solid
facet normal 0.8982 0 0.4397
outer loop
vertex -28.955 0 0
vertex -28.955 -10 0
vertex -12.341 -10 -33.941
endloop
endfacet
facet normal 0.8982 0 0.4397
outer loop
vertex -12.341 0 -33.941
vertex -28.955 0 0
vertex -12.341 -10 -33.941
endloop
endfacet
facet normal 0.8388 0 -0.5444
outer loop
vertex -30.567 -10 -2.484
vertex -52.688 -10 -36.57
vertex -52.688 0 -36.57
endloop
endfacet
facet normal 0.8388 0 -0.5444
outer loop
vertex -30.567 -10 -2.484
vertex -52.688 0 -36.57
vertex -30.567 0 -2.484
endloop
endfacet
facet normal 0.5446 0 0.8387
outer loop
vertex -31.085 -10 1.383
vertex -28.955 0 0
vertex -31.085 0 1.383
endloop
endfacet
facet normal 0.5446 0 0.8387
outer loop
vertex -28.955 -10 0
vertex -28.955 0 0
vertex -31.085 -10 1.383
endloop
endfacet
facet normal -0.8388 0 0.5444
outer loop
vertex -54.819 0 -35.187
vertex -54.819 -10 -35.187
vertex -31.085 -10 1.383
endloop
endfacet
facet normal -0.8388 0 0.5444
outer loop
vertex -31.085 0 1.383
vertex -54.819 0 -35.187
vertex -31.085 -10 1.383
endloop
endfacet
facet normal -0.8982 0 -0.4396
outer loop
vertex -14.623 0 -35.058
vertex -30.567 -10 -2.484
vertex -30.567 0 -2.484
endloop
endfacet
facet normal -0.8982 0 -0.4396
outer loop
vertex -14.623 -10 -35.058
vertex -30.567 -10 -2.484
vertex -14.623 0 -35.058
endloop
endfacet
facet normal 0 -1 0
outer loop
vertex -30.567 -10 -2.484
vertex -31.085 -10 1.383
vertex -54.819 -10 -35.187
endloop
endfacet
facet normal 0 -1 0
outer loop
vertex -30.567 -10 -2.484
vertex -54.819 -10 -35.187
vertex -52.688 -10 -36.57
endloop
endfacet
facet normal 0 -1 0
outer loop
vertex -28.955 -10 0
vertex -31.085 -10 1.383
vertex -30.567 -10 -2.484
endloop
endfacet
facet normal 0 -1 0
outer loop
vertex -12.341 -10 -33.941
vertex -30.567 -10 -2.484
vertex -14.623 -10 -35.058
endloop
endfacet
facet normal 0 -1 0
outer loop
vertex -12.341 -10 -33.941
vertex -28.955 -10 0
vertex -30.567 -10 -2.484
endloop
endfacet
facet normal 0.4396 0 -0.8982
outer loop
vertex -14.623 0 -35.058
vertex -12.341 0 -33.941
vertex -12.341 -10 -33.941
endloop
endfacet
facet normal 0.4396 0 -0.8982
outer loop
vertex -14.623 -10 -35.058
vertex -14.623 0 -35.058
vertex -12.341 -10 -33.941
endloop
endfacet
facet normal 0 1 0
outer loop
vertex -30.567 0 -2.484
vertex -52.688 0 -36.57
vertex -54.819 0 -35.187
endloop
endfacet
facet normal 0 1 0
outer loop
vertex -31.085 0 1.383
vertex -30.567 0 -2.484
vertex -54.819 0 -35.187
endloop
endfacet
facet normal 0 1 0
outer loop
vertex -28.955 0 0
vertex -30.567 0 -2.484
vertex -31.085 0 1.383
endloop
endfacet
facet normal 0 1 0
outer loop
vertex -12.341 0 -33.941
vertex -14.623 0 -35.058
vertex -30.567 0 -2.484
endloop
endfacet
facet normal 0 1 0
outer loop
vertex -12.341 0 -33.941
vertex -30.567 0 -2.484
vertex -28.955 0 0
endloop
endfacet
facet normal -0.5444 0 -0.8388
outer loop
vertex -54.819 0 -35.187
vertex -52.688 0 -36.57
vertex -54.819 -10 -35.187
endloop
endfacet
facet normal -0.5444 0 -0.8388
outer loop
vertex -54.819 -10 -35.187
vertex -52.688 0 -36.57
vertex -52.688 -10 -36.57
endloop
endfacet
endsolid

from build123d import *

# Parameters (mm, degrees)
F1_E0_W  = 43.5960156369
F1_E0_H  = 10
F2_DEPTH = 2.54
F1_E1_W  = 37.7890589032
F1_E1_H  = 10
F3_DEPTH = 2.54


with BuildPart() as f2:
    # F1_E0 (on explicit) → F2 (new body)
    with BuildSketch(Plane(origin=(-52.6879653335, 0, -36.5696884692), x_dir=(0.5443919443, 0, 0.8388309788), z_dir=(0.8388309788, 0, -0.5443919443))):
        with Locations((21.7980078184, 5)):
            Rectangle(F1_E0_W, F1_E0_H)
    extrude(amount=-F2_DEPTH)

    # F1_E1 (on explicit) → F3 (join)
    with BuildSketch(Plane(origin=(-28.9546456188, 0, 0), x_dir=(0.4396331317, 0, -0.8981774376), z_dir=(-0.8981774376, 0, -0.4396331317))):
        with Locations((18.8945294516, 5)):
            Rectangle(F1_E1_W, F1_E1_H)
    extrude(amount=F3_DEPTH)


solid = f2.part
